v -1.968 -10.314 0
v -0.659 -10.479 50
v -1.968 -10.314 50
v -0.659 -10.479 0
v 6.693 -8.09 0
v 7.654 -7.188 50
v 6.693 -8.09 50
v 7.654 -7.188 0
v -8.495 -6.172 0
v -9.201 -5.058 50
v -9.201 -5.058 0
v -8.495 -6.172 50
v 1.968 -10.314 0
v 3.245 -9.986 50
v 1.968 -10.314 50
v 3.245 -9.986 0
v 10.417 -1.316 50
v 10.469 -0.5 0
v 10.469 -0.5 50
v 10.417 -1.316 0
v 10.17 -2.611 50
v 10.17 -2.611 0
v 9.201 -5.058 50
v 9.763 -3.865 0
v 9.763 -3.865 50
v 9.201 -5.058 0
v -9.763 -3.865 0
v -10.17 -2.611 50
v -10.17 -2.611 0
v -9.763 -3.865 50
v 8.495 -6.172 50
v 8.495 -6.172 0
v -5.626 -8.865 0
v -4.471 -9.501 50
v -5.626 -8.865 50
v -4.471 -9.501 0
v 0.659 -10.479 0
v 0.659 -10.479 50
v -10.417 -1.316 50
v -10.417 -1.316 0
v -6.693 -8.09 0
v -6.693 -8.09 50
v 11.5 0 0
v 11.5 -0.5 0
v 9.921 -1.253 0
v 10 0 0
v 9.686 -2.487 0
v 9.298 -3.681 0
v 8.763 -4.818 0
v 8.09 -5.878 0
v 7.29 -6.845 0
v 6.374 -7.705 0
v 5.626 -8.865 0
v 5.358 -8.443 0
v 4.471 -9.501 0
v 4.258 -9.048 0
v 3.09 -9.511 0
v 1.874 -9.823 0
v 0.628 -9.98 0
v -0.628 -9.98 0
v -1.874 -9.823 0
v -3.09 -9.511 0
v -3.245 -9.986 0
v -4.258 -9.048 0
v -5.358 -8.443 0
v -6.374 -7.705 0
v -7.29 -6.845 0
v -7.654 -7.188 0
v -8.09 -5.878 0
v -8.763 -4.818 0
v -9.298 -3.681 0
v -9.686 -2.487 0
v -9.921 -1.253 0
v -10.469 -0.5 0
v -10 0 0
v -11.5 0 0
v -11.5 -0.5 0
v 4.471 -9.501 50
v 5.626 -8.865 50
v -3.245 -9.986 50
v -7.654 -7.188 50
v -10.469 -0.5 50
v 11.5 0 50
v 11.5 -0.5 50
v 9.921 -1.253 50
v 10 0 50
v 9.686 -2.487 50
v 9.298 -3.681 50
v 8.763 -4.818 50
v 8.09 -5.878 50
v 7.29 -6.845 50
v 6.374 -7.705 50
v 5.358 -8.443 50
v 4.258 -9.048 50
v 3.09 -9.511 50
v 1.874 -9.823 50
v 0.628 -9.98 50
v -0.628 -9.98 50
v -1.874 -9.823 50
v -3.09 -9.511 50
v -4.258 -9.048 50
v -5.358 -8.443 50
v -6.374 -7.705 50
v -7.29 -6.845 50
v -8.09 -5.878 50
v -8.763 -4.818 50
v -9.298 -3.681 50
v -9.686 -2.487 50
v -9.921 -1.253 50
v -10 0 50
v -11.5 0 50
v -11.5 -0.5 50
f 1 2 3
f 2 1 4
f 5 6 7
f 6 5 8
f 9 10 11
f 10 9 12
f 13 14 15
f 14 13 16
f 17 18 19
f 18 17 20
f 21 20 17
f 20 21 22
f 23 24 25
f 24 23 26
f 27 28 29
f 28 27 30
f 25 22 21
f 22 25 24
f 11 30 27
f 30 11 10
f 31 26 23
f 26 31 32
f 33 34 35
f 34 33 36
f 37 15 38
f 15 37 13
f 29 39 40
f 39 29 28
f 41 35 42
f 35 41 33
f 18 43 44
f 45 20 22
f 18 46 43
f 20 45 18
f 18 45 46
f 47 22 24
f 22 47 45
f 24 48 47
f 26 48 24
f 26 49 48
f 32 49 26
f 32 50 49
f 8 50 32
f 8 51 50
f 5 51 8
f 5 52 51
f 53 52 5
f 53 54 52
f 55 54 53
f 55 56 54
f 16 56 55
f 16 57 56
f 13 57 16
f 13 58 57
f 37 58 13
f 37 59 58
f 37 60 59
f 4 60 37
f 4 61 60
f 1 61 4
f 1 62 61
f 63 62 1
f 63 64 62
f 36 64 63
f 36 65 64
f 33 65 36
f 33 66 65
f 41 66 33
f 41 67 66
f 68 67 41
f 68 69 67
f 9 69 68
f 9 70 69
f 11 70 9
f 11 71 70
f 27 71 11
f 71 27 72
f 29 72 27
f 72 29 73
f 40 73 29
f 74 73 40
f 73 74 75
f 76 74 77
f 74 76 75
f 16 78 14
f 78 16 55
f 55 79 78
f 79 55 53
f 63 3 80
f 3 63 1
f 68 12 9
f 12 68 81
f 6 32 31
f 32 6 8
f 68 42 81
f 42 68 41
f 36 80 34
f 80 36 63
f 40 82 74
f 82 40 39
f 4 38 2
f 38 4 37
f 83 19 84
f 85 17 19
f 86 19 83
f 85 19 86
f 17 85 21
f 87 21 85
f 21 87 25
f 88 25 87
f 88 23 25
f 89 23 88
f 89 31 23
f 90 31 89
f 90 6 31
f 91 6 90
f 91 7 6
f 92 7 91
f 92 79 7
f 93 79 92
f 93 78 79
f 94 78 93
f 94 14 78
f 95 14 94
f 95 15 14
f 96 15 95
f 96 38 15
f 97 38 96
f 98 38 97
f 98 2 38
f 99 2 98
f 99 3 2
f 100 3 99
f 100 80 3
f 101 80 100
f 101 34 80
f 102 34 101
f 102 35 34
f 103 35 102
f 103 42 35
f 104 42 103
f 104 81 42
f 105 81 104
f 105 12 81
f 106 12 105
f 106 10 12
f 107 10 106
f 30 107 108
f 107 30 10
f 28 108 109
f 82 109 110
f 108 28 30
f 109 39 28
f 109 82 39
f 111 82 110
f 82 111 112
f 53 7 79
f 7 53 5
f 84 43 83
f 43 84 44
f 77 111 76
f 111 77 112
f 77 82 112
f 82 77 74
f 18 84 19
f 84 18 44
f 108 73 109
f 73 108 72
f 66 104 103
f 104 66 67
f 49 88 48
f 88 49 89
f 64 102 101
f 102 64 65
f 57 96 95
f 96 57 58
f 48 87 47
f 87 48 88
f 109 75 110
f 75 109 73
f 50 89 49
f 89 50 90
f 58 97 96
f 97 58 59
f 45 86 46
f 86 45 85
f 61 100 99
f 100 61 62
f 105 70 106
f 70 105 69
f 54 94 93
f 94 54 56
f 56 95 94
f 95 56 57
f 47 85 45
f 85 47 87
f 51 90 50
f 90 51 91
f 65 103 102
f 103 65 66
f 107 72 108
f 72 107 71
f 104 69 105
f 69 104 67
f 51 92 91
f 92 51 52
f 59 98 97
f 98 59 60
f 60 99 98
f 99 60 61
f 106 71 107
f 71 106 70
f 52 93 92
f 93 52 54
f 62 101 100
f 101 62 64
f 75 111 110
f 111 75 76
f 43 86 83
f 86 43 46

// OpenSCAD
wall = 0.5;
al_width = 5;
al_height = 1;
led_width = 10;   // Largura da fita led
led_length = 50;  // Comprimento de cada segmento
N = 1;            // Número de segmentos

tab_width = 1;

factor = 2.0;

difference(){

    union(){
        cylinder( d = factor * led_width + 2 * wall, h = N * led_length, $fn = 50 );
        translate( [ -factor * led_width / 2 - wall - tab_width, -wall, 0 ] )
            cube( [ factor * led_width + 2 * wall + 2 * tab_width, wall + 1, N * led_length ] );
    }

    translate( [ 0, 0, -1 ] )
        cylinder( d = factor * led_width, h = N * led_length + 2, $fn = 50 );

    translate( [ -factor * led_width, 0, -1 ] )
        cube( [ 2 * factor * led_width, 10 * factor * led_width, N * led_length + 2 ] );    
}
//translate( [ -factor * led_width / 2 - wall, 0, 0 ] )
//    cube( [ factor * led_width + 2 * wall, wall, N * led_length ] );    

//cube( [ factor * led_width * 3.15 / 2.0, N * led_length, 0.32 ] );
